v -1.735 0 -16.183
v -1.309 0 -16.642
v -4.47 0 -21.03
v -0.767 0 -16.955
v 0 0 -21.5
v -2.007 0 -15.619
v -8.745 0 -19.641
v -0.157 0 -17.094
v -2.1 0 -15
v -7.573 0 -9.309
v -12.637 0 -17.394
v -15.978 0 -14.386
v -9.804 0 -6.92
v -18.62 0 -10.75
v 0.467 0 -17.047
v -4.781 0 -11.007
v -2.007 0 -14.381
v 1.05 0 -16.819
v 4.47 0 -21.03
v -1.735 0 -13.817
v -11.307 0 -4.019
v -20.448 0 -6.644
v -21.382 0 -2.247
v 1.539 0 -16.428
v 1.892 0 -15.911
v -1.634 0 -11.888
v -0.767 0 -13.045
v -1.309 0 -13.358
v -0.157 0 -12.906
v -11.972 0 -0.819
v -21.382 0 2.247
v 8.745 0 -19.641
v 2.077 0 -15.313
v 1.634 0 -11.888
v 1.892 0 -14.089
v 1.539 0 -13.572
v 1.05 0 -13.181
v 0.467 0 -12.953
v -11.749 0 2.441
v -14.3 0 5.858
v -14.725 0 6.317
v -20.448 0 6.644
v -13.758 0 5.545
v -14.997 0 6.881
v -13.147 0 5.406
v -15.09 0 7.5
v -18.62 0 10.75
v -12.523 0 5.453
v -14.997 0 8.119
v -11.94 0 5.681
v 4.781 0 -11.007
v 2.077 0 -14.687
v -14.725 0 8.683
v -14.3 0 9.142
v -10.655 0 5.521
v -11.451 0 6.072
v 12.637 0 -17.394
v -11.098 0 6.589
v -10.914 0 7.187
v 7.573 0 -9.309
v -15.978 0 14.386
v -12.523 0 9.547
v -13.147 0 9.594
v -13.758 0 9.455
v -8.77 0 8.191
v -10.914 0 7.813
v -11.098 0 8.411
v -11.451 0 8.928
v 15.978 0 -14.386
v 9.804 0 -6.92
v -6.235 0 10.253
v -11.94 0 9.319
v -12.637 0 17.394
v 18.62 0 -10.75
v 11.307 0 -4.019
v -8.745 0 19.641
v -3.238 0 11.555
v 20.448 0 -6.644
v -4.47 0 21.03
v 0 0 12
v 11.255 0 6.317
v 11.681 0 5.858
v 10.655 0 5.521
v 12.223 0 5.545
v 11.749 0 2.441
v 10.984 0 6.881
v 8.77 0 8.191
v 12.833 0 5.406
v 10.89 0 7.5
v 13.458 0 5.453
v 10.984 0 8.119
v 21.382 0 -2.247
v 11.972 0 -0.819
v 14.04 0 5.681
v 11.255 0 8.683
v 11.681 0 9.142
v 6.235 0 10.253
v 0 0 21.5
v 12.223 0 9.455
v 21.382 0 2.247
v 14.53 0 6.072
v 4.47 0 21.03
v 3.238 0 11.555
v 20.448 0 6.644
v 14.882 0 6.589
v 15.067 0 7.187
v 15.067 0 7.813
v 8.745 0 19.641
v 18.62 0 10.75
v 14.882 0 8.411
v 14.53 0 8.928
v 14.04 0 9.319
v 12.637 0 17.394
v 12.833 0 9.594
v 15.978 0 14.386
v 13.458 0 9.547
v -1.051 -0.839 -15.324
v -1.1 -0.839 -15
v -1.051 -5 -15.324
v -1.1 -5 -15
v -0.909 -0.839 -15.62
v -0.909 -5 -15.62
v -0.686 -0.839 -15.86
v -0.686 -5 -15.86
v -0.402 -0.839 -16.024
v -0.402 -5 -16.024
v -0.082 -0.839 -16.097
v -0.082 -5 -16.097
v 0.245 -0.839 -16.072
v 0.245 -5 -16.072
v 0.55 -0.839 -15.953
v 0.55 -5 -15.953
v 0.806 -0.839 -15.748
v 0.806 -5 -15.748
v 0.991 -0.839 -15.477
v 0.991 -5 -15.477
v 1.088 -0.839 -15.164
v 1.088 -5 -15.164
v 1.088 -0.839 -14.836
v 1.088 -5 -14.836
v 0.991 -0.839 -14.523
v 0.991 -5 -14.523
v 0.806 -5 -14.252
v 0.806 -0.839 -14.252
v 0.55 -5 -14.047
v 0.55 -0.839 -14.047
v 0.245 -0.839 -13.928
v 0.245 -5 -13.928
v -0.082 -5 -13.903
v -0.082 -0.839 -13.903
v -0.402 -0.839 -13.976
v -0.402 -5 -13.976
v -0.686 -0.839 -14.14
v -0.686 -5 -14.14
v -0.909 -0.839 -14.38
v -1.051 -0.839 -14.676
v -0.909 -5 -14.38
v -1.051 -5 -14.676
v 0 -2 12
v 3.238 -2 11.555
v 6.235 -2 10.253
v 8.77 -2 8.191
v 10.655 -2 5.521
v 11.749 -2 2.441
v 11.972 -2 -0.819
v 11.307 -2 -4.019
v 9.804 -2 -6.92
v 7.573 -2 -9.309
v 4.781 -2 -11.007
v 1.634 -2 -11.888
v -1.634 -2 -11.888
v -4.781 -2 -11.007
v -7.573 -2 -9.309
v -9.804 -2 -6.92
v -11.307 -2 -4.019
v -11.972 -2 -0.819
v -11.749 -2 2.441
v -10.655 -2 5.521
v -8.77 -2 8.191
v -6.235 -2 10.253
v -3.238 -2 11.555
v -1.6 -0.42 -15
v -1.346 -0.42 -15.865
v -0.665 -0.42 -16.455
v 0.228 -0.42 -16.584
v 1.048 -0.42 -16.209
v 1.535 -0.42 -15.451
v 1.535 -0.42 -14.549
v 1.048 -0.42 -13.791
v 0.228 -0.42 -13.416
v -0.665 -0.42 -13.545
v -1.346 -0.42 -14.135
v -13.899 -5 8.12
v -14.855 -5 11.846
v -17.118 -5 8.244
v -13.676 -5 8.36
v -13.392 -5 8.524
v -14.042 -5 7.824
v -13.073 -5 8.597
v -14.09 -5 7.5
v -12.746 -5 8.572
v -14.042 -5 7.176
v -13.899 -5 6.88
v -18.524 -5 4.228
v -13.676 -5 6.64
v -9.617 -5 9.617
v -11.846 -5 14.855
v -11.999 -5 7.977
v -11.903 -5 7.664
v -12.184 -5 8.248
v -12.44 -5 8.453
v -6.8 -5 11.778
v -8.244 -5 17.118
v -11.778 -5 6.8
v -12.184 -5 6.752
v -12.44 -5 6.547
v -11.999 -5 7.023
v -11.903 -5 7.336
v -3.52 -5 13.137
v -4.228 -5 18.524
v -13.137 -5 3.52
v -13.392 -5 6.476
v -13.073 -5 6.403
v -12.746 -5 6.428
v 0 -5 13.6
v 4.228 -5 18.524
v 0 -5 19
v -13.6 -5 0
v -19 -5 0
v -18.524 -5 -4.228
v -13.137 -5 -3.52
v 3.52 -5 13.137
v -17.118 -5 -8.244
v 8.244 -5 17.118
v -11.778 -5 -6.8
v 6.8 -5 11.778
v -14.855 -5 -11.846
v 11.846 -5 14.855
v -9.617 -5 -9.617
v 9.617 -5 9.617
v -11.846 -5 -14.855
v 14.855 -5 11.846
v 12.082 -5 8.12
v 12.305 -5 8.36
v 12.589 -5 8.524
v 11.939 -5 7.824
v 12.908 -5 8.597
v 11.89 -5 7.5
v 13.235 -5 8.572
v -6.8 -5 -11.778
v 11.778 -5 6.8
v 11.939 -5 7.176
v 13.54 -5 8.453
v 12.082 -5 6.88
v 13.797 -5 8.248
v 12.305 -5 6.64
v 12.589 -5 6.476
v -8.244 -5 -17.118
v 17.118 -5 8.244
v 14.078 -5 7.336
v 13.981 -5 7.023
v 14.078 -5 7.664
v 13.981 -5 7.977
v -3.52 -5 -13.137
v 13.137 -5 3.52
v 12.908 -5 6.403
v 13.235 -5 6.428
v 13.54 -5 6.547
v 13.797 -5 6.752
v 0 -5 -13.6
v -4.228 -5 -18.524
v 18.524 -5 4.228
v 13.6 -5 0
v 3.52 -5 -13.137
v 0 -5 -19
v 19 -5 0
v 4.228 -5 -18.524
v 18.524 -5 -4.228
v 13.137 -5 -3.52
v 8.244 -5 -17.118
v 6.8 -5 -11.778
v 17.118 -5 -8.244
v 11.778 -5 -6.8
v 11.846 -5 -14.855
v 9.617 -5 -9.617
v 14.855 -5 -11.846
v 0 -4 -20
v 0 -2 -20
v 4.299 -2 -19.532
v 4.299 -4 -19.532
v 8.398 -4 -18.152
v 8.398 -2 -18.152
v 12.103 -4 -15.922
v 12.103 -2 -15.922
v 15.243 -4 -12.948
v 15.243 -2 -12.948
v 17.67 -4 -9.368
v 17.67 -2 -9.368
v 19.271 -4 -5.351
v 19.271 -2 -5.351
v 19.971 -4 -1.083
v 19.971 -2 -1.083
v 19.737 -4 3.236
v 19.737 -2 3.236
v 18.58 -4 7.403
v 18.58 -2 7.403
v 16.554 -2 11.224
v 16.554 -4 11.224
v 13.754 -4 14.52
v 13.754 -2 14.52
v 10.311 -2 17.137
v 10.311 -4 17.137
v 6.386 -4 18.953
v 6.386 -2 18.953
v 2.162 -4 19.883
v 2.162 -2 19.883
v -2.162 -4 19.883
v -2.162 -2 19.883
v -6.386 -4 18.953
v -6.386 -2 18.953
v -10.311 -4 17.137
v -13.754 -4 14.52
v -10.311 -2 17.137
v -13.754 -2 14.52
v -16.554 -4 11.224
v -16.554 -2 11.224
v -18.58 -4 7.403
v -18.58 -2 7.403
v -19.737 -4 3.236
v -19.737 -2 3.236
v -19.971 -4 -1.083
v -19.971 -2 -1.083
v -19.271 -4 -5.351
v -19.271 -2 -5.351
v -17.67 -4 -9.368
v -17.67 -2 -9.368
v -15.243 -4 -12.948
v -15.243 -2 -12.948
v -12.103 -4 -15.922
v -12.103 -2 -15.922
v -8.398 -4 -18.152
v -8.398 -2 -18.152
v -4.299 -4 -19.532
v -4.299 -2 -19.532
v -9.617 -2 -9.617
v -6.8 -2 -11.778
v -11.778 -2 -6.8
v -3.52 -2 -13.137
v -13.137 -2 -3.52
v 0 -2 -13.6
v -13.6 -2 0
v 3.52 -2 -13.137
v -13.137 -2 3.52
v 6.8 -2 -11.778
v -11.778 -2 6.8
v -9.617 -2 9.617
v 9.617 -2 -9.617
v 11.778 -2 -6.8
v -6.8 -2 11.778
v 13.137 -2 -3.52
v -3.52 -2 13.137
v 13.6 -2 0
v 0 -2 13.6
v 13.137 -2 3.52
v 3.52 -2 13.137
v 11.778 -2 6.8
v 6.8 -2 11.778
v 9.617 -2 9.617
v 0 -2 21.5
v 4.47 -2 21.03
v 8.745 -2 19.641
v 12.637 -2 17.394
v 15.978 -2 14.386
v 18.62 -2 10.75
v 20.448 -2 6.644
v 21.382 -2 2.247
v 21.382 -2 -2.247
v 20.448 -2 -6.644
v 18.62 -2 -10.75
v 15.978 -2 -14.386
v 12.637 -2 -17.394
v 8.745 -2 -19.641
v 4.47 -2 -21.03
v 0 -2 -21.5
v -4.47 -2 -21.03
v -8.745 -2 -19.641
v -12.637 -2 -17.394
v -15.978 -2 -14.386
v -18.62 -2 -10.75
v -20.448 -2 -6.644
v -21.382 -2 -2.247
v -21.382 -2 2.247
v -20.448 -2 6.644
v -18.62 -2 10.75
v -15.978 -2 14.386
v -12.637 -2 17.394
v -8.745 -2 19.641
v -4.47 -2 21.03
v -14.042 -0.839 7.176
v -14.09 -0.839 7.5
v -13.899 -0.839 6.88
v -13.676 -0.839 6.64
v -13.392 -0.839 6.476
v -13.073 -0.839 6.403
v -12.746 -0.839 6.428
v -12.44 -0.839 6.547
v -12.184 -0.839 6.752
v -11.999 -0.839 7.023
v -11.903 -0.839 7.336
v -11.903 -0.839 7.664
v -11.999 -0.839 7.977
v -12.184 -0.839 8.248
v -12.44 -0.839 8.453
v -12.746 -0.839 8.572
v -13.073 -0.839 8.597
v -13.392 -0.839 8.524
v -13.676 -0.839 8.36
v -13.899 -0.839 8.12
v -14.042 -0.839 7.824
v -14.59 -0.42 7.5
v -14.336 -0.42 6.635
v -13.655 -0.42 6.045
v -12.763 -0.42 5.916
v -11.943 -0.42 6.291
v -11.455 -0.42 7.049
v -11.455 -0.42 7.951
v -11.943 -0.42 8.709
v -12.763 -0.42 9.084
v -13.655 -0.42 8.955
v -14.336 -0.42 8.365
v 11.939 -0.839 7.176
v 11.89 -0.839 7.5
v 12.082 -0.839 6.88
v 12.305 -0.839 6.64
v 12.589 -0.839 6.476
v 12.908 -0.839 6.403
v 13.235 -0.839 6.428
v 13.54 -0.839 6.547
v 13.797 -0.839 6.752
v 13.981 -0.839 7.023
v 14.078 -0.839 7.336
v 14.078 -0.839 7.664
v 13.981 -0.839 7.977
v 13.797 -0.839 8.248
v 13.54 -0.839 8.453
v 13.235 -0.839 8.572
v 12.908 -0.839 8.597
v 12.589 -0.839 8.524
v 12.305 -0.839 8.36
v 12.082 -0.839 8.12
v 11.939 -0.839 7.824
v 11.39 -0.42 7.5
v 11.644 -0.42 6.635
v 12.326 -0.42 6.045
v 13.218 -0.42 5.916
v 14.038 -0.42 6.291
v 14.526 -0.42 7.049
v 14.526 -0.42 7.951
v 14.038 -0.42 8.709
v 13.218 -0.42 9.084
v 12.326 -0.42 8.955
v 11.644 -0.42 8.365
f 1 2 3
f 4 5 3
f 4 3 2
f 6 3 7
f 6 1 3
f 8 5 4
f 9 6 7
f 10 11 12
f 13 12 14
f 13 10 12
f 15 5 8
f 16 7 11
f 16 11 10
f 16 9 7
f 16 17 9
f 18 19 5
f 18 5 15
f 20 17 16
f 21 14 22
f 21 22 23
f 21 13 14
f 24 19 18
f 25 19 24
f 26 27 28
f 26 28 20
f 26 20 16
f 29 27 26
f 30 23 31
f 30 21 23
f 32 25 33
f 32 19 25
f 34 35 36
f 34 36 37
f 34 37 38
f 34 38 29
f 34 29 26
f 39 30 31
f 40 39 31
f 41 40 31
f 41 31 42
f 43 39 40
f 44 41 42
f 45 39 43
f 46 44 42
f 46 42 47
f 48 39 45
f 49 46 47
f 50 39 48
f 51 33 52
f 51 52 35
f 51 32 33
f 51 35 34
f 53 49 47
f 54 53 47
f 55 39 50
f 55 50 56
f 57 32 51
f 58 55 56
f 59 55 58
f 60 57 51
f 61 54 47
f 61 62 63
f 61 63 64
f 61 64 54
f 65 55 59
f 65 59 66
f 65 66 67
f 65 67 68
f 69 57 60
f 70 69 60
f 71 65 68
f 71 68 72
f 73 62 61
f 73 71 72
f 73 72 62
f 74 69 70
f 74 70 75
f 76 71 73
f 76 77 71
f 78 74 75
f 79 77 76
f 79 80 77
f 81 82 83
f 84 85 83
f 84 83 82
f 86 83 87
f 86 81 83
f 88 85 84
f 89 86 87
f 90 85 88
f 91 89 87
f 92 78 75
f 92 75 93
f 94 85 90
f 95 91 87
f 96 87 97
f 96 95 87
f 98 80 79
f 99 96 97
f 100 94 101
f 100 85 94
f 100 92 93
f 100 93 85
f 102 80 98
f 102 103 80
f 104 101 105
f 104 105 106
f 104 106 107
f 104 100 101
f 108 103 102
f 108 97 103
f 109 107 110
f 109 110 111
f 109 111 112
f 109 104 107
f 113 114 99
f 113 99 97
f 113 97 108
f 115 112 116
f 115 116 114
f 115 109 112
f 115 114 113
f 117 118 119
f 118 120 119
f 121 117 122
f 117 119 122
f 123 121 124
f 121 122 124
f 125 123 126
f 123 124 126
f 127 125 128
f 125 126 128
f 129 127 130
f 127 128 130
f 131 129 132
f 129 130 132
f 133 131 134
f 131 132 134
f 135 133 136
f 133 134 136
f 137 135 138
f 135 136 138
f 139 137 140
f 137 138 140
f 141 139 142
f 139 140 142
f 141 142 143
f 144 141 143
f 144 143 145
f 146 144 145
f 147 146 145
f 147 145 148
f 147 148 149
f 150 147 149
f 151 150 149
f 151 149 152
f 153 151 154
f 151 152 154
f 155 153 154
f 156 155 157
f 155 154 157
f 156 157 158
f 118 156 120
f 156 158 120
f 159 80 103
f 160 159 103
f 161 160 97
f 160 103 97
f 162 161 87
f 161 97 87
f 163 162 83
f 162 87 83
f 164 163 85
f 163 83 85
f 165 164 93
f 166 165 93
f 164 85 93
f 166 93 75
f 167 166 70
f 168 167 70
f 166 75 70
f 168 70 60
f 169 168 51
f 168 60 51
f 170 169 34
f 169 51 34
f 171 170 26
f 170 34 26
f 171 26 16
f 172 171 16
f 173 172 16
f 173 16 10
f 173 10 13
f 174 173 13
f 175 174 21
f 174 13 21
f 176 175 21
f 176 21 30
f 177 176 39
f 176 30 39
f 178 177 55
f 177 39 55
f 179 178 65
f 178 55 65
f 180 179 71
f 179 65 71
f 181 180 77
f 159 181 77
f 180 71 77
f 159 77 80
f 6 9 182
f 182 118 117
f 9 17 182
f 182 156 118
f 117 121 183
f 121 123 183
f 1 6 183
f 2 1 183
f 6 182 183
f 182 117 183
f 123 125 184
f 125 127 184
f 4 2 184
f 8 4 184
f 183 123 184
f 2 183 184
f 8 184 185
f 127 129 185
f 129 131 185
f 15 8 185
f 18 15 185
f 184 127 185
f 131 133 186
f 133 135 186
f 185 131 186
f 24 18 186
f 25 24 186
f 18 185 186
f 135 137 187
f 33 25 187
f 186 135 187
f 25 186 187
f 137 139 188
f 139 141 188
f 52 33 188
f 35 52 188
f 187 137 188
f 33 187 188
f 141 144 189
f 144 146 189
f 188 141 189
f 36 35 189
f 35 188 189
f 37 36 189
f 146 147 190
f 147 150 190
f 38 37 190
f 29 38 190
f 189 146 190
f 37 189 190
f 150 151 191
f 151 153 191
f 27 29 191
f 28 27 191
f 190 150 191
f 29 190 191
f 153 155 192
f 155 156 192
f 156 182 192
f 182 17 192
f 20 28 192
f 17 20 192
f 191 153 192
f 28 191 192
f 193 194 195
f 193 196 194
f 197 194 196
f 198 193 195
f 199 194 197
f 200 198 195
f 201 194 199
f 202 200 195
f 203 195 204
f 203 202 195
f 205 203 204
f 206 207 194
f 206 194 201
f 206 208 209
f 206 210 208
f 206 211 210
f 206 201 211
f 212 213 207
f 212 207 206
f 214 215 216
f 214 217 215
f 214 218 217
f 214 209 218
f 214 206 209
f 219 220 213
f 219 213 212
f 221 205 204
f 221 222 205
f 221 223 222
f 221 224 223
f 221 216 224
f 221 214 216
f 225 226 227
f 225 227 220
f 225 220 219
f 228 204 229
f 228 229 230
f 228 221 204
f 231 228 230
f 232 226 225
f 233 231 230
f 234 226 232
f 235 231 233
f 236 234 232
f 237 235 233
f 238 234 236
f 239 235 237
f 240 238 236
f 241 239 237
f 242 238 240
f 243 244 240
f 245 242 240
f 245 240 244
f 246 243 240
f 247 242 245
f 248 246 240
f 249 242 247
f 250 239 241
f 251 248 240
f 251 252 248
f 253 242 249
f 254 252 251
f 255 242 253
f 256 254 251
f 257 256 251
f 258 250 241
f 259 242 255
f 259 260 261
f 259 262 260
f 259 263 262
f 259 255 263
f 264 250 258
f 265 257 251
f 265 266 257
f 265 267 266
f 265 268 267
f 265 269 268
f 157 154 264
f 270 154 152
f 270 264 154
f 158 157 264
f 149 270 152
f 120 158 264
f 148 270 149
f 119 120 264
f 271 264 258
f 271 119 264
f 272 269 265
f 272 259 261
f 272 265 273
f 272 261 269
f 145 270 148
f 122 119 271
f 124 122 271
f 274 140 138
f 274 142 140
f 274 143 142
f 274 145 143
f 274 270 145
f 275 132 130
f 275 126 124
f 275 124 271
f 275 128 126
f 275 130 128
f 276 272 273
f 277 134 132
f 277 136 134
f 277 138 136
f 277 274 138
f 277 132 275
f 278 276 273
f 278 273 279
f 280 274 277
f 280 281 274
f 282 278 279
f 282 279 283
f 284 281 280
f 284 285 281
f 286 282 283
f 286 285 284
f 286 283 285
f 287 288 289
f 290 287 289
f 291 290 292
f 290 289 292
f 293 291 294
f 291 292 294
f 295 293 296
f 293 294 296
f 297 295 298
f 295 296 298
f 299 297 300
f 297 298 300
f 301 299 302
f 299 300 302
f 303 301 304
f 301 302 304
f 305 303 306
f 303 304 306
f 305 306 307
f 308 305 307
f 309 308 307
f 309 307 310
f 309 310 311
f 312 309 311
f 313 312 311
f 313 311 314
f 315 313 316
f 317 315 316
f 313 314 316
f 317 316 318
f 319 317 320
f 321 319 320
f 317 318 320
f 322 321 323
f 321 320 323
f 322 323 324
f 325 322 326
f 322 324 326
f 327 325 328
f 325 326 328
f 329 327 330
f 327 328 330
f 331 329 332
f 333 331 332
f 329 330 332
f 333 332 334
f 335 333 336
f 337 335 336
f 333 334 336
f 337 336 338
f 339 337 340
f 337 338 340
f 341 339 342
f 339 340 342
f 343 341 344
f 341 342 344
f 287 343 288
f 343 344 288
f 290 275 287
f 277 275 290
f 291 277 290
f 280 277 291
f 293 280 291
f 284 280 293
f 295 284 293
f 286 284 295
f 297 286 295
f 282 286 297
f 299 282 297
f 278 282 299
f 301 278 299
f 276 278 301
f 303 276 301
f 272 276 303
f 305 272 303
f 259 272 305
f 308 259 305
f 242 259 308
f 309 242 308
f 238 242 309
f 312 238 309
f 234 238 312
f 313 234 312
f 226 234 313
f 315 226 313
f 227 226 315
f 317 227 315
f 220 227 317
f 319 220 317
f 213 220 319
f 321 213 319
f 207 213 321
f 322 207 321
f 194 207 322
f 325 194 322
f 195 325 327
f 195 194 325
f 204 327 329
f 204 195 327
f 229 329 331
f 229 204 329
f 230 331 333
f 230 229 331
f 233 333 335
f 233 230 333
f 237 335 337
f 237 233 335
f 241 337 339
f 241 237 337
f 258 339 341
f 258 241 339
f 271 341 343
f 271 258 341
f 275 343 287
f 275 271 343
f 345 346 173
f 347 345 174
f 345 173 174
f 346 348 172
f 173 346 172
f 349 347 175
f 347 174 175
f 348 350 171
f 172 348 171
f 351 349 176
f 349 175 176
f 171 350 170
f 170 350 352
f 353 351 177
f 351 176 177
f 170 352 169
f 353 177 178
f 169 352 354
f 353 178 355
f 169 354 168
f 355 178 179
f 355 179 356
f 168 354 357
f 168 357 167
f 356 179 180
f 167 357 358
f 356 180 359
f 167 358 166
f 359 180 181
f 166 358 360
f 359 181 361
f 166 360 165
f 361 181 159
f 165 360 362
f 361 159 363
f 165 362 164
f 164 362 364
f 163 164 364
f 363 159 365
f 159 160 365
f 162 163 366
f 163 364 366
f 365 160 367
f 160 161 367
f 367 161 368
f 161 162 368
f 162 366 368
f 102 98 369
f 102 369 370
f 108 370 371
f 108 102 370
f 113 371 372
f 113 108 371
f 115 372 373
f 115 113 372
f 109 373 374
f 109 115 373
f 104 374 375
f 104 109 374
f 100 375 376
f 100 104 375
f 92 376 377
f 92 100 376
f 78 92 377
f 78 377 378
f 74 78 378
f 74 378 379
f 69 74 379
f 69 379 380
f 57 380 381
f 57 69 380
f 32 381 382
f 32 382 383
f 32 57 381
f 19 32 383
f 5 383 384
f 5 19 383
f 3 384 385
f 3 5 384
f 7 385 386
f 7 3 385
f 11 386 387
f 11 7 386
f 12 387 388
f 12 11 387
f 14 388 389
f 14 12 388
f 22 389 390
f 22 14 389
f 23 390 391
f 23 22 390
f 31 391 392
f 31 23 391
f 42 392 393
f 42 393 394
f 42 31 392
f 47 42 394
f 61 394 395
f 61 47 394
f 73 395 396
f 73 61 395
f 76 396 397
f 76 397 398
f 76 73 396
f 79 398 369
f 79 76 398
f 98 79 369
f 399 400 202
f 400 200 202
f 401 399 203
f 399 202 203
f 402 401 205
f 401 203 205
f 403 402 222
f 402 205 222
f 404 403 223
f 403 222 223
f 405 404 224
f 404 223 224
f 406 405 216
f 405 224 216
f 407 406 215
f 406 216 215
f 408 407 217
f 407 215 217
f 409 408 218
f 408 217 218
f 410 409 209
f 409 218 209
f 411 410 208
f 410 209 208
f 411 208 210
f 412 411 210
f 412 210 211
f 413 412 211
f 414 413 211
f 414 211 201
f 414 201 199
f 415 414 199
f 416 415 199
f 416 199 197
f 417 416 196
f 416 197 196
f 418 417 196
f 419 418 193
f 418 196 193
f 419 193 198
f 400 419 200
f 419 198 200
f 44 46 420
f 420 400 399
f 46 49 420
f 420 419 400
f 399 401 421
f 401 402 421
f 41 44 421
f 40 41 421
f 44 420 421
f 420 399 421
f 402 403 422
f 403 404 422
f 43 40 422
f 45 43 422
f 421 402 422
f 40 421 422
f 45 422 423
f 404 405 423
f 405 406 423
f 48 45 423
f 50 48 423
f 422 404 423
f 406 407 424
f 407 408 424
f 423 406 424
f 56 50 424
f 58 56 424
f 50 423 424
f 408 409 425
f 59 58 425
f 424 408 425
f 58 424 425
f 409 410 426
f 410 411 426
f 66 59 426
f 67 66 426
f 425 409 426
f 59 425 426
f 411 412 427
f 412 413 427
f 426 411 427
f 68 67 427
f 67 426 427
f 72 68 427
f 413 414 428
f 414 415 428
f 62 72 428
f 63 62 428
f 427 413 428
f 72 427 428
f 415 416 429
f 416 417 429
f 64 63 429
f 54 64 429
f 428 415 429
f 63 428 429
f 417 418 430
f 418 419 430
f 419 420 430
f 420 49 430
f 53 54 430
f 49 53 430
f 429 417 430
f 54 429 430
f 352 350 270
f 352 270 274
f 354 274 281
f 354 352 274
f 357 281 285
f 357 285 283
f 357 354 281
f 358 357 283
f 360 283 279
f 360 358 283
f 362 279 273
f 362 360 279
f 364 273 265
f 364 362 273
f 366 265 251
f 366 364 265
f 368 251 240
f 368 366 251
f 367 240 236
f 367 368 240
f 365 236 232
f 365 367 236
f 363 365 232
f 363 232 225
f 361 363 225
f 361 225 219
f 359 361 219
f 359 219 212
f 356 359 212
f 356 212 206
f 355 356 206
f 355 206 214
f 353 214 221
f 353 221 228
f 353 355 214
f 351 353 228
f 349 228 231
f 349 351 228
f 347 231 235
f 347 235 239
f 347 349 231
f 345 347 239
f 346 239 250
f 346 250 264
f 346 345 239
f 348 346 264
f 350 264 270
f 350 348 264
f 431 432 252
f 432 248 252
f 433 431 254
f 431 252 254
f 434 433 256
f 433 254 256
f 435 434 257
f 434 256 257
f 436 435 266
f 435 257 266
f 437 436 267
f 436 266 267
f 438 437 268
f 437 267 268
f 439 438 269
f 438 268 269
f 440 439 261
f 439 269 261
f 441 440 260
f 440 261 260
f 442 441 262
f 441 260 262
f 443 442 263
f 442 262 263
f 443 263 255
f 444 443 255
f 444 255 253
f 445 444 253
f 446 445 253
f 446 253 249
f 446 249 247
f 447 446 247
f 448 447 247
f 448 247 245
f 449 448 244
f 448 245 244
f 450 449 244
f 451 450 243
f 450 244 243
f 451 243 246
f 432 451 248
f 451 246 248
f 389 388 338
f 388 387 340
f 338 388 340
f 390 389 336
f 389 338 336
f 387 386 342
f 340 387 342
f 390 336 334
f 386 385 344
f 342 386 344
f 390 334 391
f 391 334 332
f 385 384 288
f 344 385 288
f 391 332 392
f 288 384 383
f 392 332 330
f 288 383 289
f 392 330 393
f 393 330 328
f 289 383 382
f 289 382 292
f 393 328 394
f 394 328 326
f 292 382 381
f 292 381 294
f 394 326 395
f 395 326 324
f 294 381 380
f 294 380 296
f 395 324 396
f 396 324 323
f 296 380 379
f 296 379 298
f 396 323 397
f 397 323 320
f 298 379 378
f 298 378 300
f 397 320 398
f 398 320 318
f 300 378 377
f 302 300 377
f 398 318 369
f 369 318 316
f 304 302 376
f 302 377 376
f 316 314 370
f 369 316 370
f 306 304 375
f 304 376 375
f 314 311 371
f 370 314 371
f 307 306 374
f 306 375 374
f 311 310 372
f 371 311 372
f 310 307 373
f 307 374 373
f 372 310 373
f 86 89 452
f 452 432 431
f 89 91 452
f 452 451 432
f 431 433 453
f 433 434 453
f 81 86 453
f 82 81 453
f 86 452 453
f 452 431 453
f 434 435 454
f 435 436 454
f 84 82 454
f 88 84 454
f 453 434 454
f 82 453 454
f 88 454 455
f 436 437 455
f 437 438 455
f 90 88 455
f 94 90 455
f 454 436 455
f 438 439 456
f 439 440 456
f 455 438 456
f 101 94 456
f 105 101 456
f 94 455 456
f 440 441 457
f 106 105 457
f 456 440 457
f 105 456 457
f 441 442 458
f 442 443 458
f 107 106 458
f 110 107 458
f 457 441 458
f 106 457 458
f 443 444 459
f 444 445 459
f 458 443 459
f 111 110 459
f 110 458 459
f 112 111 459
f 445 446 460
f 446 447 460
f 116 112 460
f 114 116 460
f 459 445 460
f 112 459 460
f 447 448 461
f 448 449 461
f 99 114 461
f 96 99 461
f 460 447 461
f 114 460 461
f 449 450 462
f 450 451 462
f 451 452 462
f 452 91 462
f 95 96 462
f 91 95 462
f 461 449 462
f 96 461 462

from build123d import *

# Parameters (mm, degrees)
SKETCH1_R                                         = 21.5
SKETCH1_R_2                                       = 12
BOSS_EXTRUDE1_DEPTH                               = 2
SKETCH2_R                                         = 20
SKETCH2_R_2                                       = 13.6
BOSS_EXTRUDE2_DEPTH                               = 3
CHAMFER1_SIZE                                     = 1
CSK_FOR_0_FLAT_HEAD_MACHINE_SCREW_100_D           = 2.199999918
CSK_FOR_0_FLAT_HEAD_MACHINE_SCREW_100_CSINK_D     = 4.199999982
CSK_FOR_0_FLAT_HEAD_MACHINE_SCREW_100_CSINK_ANGLE = 100


with BuildPart() as part:
    # Sketch1 → Boss-Extrude1 (new body)
    with BuildSketch(Plane(origin=(0, 0, 0), x_dir=(1, 0, 0), z_dir=(0, 1, 0))):
        with Locations(Location((0, 0, 0), (0, 0, 270))):
            Circle(SKETCH1_R)
        with Locations(Location((0, 0, 0), (0, 0, 270))):
            Circle(SKETCH1_R_2, mode=Mode.SUBTRACT)
    extrude(amount=-BOSS_EXTRUDE1_DEPTH)

    # Sketch2 → Boss-Extrude2 (add)
    with BuildSketch(Plane.XZ.offset(2)):
        with Locations(Location((0, 0, 0), (0, 0, 270))):
            Circle(SKETCH2_R)
        with Locations(Location((0, 0, 0), (0, 0, 270))):
            Circle(SKETCH2_R_2, mode=Mode.SUBTRACT)
    extrude(amount=BOSS_EXTRUDE2_DEPTH)

    # Chamfer1
    chamfer1_edges = [part.edges().sort_by_distance(p)[0] for p in [
        (0, -5, 20),
    ]]
    chamfer(chamfer1_edges, length=CHAMFER1_SIZE)

    # CSK for #0 Flat Head Machine Screw (100)1 (through all)
    with Locations(Plane(origin=(0, 0, 0), x_dir=(1, 0, 0), z_dir=(0, 1, 0))):
        with Locations((0, 15), (12.990381057, -7.5), (-12.990381057, -7.5)):
            CounterSinkHole(CSK_FOR_0_FLAT_HEAD_MACHINE_SCREW_100_D / 2, CSK_FOR_0_FLAT_HEAD_MACHINE_SCREW_100_CSINK_D / 2, counter_sink_angle=CSK_FOR_0_FLAT_HEAD_MACHINE_SCREW_100_CSINK_ANGLE)


solid = part.part
